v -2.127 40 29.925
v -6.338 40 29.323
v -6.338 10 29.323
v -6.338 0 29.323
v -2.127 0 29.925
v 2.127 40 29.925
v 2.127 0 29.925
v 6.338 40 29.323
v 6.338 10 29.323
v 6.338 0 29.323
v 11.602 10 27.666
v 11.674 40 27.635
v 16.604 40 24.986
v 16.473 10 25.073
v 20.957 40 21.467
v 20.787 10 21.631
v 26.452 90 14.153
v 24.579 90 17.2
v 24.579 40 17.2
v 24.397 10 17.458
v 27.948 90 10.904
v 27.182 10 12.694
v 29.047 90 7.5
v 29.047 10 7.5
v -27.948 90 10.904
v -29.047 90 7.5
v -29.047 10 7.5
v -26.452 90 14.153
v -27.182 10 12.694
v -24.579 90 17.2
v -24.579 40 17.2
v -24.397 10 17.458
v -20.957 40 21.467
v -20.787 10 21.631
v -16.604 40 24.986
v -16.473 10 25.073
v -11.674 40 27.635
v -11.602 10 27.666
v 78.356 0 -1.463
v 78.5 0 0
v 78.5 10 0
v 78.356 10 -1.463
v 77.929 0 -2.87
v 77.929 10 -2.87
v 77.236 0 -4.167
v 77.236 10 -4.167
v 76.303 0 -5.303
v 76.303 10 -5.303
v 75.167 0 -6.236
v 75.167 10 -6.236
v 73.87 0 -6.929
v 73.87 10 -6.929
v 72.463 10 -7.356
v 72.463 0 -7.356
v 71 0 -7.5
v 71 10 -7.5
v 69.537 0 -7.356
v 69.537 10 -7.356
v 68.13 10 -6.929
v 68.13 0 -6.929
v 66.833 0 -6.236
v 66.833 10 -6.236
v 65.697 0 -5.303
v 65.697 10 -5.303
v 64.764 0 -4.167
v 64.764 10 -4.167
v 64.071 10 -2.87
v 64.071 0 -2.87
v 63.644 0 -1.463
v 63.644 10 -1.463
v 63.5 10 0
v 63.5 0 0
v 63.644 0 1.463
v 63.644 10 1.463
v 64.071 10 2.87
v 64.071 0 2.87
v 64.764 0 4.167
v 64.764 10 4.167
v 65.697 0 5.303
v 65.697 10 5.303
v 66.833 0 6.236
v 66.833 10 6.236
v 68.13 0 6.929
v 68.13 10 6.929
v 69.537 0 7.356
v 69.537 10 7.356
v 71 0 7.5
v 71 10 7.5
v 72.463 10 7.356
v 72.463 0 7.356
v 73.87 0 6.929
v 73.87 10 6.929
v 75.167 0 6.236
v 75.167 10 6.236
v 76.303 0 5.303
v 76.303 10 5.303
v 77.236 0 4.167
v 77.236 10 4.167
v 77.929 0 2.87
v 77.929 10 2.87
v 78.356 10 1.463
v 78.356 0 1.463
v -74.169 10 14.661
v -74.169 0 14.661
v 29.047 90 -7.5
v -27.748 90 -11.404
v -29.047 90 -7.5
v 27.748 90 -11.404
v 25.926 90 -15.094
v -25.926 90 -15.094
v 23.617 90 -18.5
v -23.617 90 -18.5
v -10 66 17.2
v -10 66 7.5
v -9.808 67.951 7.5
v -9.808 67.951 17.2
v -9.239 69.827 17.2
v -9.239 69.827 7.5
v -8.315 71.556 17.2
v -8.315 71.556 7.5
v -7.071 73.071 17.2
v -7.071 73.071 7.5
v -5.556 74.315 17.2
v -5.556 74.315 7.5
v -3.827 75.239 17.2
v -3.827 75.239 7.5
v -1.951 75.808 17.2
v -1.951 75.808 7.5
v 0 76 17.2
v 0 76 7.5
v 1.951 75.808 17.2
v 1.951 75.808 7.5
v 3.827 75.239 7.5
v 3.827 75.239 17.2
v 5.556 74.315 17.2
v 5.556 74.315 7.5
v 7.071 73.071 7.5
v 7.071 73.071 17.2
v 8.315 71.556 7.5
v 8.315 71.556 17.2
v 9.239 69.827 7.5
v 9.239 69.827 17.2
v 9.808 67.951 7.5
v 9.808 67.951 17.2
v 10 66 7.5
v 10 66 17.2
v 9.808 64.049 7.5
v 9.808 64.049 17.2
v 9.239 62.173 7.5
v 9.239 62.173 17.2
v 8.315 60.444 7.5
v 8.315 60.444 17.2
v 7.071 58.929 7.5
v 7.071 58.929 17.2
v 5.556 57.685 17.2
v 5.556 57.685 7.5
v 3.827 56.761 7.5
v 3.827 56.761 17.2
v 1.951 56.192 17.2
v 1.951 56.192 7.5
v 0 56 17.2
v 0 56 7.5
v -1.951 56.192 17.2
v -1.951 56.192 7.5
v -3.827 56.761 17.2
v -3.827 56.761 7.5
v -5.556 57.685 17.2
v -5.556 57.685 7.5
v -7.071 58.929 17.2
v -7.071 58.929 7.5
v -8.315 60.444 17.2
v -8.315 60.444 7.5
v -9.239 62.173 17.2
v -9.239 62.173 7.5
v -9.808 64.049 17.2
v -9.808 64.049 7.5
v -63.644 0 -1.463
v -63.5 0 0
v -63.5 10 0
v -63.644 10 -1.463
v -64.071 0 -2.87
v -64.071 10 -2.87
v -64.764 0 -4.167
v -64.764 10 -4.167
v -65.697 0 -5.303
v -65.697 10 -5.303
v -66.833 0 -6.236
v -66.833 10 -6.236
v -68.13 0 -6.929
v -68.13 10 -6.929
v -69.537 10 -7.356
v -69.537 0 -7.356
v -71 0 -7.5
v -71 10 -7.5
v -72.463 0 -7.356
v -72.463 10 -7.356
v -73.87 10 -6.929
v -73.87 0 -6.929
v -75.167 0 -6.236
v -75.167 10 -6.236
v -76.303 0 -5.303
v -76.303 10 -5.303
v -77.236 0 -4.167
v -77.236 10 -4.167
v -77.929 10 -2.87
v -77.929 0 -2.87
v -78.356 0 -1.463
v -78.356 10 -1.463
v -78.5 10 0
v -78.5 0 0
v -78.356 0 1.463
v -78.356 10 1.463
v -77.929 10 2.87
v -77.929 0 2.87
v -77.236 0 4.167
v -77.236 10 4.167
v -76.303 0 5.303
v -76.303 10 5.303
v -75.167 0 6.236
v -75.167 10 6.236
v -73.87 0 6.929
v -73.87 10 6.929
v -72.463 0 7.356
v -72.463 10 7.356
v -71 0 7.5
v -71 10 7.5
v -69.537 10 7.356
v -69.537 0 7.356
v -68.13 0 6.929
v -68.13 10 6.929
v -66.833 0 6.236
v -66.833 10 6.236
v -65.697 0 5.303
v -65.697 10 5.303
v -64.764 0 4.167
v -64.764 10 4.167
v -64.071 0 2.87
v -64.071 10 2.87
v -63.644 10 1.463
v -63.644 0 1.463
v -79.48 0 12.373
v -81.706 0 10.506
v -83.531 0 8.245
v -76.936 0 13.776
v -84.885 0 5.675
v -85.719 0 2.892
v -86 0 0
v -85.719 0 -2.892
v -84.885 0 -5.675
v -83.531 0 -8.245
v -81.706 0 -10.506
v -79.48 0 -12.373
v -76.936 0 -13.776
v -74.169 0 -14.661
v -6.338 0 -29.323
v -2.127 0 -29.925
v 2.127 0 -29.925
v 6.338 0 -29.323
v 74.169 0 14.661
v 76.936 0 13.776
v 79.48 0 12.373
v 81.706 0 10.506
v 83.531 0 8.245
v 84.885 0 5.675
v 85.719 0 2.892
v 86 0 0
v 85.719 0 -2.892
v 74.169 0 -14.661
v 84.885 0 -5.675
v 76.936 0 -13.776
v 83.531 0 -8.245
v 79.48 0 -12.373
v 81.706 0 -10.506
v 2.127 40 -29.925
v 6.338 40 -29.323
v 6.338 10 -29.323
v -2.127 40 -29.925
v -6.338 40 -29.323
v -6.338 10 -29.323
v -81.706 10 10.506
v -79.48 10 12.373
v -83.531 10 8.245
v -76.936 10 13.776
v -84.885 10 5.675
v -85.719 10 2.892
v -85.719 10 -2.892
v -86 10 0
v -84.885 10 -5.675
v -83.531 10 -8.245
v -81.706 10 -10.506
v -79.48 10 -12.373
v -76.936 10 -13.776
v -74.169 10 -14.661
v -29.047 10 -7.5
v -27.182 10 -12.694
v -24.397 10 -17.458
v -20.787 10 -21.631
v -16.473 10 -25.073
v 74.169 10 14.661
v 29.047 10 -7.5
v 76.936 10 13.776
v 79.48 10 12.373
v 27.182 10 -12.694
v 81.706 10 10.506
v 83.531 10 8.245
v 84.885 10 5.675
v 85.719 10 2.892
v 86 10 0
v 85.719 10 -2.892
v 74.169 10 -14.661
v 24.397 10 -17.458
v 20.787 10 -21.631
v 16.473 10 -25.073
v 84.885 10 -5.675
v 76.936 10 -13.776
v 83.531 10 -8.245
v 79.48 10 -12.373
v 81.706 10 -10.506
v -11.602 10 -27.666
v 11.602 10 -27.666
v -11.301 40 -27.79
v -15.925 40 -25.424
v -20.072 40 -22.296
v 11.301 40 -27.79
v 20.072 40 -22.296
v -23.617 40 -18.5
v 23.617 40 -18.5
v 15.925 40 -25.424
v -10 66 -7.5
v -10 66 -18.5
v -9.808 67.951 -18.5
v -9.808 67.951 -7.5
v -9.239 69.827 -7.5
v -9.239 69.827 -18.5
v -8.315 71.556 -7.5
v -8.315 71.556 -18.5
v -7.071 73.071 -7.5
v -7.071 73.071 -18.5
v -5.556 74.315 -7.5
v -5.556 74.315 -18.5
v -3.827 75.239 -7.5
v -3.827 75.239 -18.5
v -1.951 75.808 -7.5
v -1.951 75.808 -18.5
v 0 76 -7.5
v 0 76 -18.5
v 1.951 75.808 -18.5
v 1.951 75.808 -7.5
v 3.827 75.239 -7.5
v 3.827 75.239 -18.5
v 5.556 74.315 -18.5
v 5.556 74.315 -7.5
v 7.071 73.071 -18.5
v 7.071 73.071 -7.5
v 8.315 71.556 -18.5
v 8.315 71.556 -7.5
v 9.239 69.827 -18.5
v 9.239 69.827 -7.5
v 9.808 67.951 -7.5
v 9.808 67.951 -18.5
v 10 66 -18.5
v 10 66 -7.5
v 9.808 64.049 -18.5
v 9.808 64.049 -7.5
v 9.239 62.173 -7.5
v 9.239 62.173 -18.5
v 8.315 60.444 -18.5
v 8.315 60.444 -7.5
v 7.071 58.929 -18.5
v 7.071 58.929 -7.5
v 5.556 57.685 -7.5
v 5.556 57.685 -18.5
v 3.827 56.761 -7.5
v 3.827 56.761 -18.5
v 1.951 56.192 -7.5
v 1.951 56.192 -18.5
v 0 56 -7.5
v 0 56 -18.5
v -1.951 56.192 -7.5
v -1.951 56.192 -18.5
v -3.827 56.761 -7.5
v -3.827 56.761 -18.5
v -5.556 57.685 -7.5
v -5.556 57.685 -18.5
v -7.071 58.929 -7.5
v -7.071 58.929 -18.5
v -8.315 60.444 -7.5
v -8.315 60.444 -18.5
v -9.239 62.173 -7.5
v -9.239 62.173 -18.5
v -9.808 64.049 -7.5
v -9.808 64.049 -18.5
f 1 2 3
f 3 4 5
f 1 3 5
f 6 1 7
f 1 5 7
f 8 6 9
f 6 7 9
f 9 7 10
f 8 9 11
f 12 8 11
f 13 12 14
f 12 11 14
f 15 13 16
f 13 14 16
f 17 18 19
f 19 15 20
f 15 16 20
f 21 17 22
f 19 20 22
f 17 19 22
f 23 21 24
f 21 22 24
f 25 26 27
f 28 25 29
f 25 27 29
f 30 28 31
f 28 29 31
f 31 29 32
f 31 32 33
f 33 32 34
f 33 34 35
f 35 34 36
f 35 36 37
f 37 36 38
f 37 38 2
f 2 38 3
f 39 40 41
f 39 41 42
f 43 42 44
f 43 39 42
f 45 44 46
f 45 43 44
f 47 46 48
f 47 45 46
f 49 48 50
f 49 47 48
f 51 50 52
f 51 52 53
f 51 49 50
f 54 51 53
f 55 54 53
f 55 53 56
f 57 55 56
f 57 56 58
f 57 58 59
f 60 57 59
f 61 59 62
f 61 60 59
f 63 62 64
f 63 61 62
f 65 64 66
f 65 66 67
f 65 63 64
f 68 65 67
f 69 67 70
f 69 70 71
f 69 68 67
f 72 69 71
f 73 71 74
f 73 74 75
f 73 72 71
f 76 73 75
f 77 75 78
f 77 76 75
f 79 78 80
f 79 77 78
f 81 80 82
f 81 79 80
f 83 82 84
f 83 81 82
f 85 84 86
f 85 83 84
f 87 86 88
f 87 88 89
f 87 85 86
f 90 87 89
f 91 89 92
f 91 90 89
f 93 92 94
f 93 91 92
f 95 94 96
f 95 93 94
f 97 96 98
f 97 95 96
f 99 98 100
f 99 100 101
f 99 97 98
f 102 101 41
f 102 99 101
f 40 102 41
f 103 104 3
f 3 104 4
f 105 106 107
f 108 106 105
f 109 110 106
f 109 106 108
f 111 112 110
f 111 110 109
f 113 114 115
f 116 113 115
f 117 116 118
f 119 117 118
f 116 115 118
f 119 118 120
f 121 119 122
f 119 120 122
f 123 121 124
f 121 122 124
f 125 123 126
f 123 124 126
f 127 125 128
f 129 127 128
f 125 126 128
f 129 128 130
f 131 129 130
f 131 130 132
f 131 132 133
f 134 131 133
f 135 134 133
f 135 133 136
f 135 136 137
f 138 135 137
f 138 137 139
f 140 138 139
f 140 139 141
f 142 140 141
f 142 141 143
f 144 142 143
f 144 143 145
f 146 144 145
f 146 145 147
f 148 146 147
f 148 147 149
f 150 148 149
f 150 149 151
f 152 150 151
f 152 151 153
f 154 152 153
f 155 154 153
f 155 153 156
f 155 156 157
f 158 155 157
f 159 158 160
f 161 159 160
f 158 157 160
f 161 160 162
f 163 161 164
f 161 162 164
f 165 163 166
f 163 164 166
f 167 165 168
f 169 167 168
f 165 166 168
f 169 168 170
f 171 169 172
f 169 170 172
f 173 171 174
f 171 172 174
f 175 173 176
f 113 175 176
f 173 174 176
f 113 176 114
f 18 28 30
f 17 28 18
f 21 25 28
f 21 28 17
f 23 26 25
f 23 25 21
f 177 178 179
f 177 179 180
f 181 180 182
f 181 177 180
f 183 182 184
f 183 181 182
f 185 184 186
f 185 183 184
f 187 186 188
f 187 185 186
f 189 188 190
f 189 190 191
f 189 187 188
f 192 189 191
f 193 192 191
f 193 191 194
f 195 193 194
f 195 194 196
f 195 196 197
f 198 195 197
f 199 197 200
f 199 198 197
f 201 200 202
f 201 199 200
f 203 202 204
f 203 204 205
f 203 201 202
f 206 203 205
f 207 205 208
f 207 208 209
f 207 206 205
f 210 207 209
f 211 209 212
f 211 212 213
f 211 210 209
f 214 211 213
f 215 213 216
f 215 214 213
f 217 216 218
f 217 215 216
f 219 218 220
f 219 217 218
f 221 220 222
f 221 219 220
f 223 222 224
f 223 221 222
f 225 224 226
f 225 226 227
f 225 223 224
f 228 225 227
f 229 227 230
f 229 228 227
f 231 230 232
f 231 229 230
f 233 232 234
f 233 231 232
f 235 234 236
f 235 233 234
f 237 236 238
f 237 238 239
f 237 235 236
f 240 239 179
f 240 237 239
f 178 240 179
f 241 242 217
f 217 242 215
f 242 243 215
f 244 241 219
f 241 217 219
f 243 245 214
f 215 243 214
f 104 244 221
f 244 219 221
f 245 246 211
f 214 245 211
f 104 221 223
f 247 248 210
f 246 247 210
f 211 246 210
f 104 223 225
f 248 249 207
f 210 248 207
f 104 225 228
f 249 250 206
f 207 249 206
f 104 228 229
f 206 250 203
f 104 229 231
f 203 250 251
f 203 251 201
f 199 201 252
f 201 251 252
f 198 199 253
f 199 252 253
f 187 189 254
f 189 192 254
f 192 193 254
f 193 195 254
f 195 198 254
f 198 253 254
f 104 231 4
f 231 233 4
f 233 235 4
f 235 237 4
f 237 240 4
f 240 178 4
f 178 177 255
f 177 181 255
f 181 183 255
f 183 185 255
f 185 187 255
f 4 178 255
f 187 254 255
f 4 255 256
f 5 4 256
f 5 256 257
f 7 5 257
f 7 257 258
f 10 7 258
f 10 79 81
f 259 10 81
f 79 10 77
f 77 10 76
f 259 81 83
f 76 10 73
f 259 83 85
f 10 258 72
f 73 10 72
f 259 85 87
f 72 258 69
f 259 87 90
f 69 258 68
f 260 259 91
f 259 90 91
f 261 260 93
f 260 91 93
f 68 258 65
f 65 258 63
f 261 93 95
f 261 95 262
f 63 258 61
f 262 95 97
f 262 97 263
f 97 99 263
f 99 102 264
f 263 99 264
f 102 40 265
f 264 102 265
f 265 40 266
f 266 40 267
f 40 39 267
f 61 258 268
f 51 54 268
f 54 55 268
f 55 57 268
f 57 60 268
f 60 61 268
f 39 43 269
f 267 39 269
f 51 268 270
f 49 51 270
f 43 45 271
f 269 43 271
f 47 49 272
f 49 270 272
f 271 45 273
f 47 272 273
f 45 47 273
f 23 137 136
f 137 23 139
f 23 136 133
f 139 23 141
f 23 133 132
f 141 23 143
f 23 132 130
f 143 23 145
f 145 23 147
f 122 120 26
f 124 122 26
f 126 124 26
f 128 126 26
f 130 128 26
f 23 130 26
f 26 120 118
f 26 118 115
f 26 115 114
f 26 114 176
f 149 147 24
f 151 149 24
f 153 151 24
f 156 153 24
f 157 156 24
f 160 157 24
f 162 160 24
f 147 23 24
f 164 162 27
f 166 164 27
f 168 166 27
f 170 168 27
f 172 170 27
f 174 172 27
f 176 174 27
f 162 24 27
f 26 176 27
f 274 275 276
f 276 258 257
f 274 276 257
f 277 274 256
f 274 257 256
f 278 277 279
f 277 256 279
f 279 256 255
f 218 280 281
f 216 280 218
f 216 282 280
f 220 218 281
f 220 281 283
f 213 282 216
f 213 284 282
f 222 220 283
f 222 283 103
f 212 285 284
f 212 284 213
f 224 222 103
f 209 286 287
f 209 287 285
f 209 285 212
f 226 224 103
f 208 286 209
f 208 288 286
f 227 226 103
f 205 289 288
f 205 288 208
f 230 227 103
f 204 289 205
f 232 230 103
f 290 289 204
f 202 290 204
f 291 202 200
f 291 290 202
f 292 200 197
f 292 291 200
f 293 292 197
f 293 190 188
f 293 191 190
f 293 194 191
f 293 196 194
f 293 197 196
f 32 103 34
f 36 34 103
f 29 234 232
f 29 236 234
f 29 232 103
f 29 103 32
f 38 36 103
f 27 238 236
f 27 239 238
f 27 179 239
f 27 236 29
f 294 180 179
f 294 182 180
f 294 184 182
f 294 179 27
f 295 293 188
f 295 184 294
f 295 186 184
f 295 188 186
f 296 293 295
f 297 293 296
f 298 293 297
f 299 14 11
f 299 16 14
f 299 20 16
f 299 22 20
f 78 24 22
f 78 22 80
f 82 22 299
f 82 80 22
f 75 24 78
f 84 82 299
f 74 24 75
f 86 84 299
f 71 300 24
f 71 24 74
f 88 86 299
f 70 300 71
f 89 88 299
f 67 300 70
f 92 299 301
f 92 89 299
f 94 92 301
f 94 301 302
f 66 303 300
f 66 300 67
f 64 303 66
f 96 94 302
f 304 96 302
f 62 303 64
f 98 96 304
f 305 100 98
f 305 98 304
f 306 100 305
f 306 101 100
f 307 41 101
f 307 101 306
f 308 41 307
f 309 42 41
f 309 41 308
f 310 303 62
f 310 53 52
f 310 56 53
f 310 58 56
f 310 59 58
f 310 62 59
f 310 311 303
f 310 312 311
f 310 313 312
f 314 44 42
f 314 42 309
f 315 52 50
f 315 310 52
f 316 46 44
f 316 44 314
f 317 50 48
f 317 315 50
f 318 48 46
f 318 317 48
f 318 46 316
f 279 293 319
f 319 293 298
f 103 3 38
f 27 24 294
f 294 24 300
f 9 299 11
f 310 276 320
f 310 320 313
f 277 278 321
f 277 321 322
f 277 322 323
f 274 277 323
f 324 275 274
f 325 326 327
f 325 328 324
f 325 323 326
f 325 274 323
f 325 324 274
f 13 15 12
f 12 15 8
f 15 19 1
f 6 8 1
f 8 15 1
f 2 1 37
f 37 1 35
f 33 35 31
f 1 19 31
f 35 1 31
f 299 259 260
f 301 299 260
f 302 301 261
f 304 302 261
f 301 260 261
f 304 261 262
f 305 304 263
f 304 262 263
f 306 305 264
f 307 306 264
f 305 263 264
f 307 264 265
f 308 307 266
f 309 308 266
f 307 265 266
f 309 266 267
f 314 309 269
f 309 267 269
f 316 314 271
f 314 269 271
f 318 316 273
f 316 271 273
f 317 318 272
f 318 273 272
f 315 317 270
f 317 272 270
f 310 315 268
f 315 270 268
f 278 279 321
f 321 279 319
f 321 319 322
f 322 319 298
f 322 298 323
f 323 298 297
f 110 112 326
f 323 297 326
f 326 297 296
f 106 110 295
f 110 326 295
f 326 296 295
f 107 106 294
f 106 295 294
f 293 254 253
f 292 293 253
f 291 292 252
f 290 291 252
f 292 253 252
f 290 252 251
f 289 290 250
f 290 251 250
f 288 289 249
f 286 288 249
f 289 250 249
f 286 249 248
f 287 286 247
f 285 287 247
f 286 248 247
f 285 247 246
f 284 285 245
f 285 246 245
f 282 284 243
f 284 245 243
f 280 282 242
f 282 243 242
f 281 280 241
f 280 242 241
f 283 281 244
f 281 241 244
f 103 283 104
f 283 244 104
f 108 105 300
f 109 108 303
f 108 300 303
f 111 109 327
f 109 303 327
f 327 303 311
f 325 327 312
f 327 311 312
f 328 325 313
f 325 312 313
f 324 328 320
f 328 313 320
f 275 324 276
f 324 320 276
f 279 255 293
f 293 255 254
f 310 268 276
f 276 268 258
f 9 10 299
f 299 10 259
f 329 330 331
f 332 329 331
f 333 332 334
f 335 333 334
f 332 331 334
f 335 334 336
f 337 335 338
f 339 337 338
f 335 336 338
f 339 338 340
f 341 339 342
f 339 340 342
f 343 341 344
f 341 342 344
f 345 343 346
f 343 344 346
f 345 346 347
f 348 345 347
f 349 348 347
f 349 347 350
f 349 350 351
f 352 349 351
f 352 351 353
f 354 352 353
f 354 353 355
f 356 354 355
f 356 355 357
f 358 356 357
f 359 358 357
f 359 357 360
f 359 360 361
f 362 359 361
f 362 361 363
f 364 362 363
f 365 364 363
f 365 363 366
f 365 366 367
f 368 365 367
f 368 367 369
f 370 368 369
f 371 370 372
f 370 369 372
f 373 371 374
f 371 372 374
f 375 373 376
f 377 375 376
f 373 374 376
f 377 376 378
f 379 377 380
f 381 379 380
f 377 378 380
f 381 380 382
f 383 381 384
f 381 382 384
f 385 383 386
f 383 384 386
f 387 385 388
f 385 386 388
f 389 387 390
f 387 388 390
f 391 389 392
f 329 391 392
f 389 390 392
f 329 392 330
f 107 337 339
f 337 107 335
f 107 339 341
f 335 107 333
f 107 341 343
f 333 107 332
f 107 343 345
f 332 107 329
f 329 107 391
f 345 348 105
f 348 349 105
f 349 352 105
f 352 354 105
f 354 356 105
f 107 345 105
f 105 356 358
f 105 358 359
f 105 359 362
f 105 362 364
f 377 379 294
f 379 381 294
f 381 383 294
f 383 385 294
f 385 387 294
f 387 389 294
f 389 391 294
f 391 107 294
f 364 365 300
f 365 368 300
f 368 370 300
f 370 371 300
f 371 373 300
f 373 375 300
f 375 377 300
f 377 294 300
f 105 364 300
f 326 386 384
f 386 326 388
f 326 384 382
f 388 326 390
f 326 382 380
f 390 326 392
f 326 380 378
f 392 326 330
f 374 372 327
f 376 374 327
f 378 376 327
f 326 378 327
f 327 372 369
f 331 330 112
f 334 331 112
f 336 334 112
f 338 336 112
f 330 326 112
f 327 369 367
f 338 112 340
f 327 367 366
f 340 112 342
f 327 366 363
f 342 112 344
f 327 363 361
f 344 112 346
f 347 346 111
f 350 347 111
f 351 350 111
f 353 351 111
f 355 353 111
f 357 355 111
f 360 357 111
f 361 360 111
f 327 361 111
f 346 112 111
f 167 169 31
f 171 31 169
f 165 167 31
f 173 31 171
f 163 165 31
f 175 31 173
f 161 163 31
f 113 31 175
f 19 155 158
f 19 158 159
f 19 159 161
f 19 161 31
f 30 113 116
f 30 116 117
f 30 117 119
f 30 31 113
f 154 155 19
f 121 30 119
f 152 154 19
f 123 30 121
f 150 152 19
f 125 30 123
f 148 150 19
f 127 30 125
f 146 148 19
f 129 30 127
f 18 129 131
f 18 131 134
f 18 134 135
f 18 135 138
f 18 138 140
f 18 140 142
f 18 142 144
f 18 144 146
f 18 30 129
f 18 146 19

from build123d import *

# Parameters (mm, degrees)
CROQUIS1_R              = 7.5
SALIENTE_EXTRUIR1_DEPTH = 10
SALIENTE_EXTRUIR2_DEPTH = 80
CORTAR_EXTRUIR1_DEPTH   = 50
CROQUIS5_R              = 10
CORTAR_EXTRUIR2_DEPTH   = 50
CORTAR_EXTRUIR3_DEPTH   = 50


with BuildPart() as part:
    # Croquis1 → Saliente-Extruir1 (new body)
    with BuildSketch(Plane(origin=(0, 0, 0), x_dir=(1, 0, 0), z_dir=(0, 1, 0))):
        with BuildLine():
            Line((-6.338028169, 29.322847729), (-74.169014085, 14.661423864))
            ThreePointArc((-74.169014085, 14.661423864), (-86, 0), (-74.169014085, -14.661423864))
            Line((-74.169014085, -14.661423864), (-6.338028169, -29.322847729))
            ThreePointArc((-6.338028169, -29.322847729), (0, -30), (6.338028169, -29.322847729))
            Line((6.338028169, -29.322847729), (74.169014085, -14.661423864))
            ThreePointArc((74.169014085, -14.661423864), (86, 0), (74.169014085, 14.661423864))
            Line((74.169014085, 14.661423864), (6.338028169, 29.322847729))
            ThreePointArc((6.338028169, 29.322847729), (0, 30), (-6.338028169, 29.322847729))
        make_face()
        with Locations((-71, 0)):
            Circle(CROQUIS1_R, mode=Mode.SUBTRACT)
        with Locations((71, 0)):
            Circle(CROQUIS1_R, mode=Mode.SUBTRACT)
    extrude(amount=SALIENTE_EXTRUIR1_DEPTH)

    # Croquis2 → Saliente-Extruir2 (add)
    with BuildSketch(Plane(origin=(0, 10, 0), x_dir=(1, 0, 0), z_dir=(0, 1, 0))):
        with BuildLine():
            Line((29.047375097, -7.5), (-29.047375097, -7.5))
            ThreePointArc((-29.047375097, -7.5), (-20.786795371, -21.631207506), (-6.338028169, -29.322847729))
            ThreePointArc((-6.338028169, -29.322847729), (0, -30), (6.338028169, -29.322847729))
            ThreePointArc((6.338028169, -29.322847729), (20.786795371, -21.631207506), (29.047375097, -7.5))
        make_face()
        with BuildLine():
            ThreePointArc((-6.338028169, 29.322847729), (-20.786795371, 21.631207506), (-29.047375097, 7.5))
            Line((-29.047375097, 7.5), (29.047375097, 7.5))
            ThreePointArc((29.047375097, 7.5), (20.786795371, 21.631207506), (6.338028169, 29.322847729))
            ThreePointArc((6.338028169, 29.322847729), (0, 30), (-6.338028169, 29.322847729))
        make_face()
    extrude(amount=SALIENTE_EXTRUIR2_DEPTH)

    # Croquis4 → Cortar-Extruir1 (cut)
    with BuildSketch(Plane(origin=(0, 90, 0), x_dir=(1, 0, 0), z_dir=(0, 1, 0))):
        with BuildLine():
            Line((-23.616731357, 18.5), (23.616731357, 18.5))
            ThreePointArc((23.616731357, 18.5), (0, 30), (-23.616731357, 18.5))
        make_face()
    extrude(amount=-CORTAR_EXTRUIR1_DEPTH, mode=Mode.SUBTRACT)

    # Croquis5 → Cortar-Extruir2 (cut)
    with BuildSketch(Plane(origin=(0, 0, -18.5), x_dir=(-1, 0, 0), z_dir=(0, 0, -1))):
        with Locations((0, 66)):
            Circle(CROQUIS5_R)
    extrude(amount=-CORTAR_EXTRUIR2_DEPTH, mode=Mode.SUBTRACT)

    # Croquis6 → Cortar-Extruir3 (cut)
    with BuildSketch(Plane(origin=(0, 90, 0), x_dir=(1, 0, 0), z_dir=(0, 1, 0))):
        with BuildLine():
            Line((-24.57931818, -17.200497604), (24.57931818, -17.200497604))
            ThreePointArc((24.57931818, -17.200497604), (0, -30), (-24.57931818, -17.200497604))
        make_face()
    extrude(amount=-CORTAR_EXTRUIR3_DEPTH, mode=Mode.SUBTRACT)


solid = part.part
